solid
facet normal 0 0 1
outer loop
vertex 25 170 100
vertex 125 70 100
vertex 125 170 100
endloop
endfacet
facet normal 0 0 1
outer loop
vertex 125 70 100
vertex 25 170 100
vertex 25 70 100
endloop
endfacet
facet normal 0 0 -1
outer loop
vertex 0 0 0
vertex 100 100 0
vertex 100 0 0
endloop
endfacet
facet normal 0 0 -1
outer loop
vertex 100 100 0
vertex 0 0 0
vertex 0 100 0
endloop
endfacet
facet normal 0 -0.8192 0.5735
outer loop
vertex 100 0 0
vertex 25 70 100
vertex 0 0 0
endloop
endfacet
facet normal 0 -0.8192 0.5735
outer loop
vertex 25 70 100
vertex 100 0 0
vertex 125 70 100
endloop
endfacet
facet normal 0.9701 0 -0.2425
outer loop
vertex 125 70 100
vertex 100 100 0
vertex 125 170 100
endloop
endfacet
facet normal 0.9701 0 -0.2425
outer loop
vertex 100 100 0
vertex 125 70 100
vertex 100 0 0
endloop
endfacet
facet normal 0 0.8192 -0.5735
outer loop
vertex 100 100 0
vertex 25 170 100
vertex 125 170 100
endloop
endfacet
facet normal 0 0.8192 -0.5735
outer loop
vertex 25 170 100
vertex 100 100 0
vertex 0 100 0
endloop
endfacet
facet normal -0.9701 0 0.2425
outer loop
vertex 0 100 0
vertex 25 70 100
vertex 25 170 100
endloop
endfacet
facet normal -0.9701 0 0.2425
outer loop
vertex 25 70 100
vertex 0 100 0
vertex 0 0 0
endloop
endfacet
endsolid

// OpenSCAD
m = [
  [1, 0, 0.25, 0],
  [0, 1, 0.7, 0],
  [0, 0, 1, 0],
  [0, 0, 0, 1]
];

multmatrix(m) {
  cube([100, 100, 100]);
}
